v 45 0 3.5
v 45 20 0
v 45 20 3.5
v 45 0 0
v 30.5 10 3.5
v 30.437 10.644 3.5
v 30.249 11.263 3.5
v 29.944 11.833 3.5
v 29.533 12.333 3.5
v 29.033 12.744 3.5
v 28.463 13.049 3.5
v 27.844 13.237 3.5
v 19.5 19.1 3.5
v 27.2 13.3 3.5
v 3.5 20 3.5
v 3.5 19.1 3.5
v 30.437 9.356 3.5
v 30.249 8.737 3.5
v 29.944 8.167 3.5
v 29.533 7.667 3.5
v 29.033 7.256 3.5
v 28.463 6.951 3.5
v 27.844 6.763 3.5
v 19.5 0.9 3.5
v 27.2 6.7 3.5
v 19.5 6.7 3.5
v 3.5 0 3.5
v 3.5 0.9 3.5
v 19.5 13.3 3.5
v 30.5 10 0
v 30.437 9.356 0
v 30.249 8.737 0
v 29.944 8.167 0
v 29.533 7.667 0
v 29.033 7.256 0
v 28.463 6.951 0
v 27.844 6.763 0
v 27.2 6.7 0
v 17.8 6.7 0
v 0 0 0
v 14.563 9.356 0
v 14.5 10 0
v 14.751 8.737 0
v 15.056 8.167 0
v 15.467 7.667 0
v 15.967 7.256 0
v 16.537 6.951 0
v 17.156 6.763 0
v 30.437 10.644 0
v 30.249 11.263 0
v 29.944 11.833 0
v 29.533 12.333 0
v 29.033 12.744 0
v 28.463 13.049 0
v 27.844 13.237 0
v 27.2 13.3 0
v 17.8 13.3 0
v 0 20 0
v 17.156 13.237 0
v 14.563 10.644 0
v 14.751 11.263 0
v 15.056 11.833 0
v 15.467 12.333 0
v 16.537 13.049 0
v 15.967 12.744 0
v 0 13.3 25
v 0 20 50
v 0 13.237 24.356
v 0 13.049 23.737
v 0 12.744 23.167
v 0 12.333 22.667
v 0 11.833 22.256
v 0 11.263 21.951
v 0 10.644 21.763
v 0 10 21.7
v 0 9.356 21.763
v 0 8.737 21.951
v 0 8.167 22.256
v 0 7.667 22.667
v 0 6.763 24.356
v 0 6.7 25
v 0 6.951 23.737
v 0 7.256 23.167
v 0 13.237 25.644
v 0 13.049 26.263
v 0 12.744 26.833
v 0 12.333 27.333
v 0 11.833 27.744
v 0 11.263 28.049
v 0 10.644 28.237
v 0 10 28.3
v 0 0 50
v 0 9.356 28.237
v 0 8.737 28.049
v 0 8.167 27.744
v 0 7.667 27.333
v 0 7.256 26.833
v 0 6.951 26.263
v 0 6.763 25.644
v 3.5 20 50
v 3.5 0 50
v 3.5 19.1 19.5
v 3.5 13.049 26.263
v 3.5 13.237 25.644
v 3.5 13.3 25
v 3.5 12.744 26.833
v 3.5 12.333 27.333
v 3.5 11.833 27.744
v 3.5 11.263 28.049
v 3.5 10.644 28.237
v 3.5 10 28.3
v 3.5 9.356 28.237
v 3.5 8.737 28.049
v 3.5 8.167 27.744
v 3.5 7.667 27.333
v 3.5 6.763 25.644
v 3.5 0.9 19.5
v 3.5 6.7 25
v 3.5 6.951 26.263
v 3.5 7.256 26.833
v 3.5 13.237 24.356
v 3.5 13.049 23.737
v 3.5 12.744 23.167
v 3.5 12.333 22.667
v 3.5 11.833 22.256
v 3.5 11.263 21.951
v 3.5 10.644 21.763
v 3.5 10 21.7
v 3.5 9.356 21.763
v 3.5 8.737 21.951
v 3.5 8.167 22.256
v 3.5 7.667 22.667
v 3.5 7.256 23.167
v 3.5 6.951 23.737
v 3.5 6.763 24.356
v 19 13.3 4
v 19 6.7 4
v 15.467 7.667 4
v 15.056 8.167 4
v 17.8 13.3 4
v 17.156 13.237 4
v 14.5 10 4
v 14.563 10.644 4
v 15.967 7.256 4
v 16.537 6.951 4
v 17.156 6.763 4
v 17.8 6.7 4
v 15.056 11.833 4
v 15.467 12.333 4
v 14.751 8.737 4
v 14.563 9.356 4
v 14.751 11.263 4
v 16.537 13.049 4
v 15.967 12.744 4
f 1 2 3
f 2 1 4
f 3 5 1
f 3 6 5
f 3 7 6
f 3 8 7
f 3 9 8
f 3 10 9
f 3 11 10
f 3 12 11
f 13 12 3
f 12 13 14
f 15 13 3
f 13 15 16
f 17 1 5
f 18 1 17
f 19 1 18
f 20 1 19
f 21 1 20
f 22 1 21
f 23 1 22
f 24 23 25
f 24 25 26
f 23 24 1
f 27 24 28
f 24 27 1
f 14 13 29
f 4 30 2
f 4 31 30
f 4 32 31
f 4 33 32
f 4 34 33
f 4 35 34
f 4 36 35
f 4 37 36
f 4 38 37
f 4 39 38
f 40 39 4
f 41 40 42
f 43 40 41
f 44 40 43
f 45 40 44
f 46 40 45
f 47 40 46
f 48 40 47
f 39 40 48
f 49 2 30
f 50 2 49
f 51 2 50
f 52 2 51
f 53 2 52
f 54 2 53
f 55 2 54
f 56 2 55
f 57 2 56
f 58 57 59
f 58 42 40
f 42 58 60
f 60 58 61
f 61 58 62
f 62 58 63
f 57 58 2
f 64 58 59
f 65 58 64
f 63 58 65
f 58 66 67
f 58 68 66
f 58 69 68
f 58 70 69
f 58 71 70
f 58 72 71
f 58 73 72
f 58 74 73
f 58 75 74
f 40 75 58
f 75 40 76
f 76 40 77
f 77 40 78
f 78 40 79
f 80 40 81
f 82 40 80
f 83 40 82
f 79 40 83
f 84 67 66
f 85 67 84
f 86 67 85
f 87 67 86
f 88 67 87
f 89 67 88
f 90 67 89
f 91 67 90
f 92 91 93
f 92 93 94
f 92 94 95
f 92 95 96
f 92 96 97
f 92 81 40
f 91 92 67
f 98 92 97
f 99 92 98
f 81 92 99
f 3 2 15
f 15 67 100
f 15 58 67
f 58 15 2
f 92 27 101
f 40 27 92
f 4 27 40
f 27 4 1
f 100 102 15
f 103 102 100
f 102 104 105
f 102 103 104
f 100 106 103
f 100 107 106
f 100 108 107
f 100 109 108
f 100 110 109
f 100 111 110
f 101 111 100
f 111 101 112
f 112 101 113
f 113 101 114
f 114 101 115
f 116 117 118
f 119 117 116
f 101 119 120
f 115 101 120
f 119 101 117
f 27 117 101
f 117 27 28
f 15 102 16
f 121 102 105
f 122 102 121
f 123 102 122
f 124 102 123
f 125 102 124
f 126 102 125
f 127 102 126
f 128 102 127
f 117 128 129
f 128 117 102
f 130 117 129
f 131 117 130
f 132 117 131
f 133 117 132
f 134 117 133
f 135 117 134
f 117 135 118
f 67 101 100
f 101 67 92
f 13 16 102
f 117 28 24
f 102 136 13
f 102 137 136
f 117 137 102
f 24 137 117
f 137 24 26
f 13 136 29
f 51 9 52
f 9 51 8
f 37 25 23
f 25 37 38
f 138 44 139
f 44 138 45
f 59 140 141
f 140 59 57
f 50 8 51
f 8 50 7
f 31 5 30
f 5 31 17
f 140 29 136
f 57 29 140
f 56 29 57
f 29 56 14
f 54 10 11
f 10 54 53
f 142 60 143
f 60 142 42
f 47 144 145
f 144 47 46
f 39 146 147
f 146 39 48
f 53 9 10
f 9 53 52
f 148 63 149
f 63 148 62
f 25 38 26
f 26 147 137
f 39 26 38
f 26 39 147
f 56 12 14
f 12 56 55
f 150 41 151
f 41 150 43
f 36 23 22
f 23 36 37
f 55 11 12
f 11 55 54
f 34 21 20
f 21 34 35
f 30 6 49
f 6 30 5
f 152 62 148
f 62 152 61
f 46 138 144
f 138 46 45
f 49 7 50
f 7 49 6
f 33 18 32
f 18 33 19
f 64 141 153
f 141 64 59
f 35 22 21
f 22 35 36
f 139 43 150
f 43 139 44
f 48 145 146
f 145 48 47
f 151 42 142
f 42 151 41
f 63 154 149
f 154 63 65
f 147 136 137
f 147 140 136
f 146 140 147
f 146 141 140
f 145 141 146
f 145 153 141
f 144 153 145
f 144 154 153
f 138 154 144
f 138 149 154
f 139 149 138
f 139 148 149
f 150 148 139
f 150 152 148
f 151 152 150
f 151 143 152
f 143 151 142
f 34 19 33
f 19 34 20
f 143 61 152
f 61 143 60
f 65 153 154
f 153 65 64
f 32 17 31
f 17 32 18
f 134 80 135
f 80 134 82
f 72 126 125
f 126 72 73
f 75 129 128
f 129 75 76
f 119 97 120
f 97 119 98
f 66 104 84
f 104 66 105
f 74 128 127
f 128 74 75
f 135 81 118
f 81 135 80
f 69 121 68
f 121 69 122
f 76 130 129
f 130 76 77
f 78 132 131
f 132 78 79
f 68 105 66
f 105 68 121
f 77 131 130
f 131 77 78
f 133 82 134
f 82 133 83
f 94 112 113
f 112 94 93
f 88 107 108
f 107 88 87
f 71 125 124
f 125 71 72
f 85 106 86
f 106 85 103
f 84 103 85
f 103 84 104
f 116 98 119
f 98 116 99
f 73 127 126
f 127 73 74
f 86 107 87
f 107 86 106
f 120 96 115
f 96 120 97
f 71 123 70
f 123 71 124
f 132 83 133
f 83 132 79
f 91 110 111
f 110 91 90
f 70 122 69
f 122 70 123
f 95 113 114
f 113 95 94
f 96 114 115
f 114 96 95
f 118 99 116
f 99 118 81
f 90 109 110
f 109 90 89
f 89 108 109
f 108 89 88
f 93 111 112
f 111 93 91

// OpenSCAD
$fn = 32;

// ----------------------------------------------------------------------
// L-bracket: 45 x 20 x 50 mm
// ----------------------------------------------------------------------

// --- parameters (mm) ---
arm_x = 45;               // horizontal leg, X
arm_z = 50;               // vertical leg, Z
width = 20;               // bracket depth, Y
wall = 3.5;               // plate thickness
hole_d = 6.6;             // clearance for M6
slot_l = 16;              // adjustment slot length
rib_leg = 22.1;           // gusset leg
rib_sink = 0.9;           // gusset overlap into the plates

module hole_z(px, py) {
  translate([px, py, -0.5]) cylinder(h = wall + 1, d = hole_d);
}
module hole_x(pz, py) {
  translate([-0.5, py, pz]) rotate([0, 90, 0]) cylinder(h = wall + 1, d = hole_d);
}
module adjust_slot(px, py) {
  hull() {
    translate([px - (slot_l - hole_d) / 2, py, -0.5]) cylinder(h = wall + 1, d = hole_d);
    translate([px + (slot_l - hole_d) / 2, py, -0.5]) cylinder(h = wall + 1, d = hole_d);
  }
}
module gusset() {
  translate([0, width - rib_sink, 0])
    rotate([90, 0, 0])
      linear_extrude(height = width - 2 * rib_sink)
        polygon(points = [[rib_sink, rib_sink], [rib_leg, rib_sink], [rib_sink, rib_leg]]);
}

difference() {
  union() {
    /* horizontal leg */
    cube([arm_x, width, wall]);
    /* vertical leg, overlapping the corner block */
    cube([wall, width, arm_z]);
    gusset();
  }
  adjust_slot(22.5, 10);
  hole_x(25, 10);
}
